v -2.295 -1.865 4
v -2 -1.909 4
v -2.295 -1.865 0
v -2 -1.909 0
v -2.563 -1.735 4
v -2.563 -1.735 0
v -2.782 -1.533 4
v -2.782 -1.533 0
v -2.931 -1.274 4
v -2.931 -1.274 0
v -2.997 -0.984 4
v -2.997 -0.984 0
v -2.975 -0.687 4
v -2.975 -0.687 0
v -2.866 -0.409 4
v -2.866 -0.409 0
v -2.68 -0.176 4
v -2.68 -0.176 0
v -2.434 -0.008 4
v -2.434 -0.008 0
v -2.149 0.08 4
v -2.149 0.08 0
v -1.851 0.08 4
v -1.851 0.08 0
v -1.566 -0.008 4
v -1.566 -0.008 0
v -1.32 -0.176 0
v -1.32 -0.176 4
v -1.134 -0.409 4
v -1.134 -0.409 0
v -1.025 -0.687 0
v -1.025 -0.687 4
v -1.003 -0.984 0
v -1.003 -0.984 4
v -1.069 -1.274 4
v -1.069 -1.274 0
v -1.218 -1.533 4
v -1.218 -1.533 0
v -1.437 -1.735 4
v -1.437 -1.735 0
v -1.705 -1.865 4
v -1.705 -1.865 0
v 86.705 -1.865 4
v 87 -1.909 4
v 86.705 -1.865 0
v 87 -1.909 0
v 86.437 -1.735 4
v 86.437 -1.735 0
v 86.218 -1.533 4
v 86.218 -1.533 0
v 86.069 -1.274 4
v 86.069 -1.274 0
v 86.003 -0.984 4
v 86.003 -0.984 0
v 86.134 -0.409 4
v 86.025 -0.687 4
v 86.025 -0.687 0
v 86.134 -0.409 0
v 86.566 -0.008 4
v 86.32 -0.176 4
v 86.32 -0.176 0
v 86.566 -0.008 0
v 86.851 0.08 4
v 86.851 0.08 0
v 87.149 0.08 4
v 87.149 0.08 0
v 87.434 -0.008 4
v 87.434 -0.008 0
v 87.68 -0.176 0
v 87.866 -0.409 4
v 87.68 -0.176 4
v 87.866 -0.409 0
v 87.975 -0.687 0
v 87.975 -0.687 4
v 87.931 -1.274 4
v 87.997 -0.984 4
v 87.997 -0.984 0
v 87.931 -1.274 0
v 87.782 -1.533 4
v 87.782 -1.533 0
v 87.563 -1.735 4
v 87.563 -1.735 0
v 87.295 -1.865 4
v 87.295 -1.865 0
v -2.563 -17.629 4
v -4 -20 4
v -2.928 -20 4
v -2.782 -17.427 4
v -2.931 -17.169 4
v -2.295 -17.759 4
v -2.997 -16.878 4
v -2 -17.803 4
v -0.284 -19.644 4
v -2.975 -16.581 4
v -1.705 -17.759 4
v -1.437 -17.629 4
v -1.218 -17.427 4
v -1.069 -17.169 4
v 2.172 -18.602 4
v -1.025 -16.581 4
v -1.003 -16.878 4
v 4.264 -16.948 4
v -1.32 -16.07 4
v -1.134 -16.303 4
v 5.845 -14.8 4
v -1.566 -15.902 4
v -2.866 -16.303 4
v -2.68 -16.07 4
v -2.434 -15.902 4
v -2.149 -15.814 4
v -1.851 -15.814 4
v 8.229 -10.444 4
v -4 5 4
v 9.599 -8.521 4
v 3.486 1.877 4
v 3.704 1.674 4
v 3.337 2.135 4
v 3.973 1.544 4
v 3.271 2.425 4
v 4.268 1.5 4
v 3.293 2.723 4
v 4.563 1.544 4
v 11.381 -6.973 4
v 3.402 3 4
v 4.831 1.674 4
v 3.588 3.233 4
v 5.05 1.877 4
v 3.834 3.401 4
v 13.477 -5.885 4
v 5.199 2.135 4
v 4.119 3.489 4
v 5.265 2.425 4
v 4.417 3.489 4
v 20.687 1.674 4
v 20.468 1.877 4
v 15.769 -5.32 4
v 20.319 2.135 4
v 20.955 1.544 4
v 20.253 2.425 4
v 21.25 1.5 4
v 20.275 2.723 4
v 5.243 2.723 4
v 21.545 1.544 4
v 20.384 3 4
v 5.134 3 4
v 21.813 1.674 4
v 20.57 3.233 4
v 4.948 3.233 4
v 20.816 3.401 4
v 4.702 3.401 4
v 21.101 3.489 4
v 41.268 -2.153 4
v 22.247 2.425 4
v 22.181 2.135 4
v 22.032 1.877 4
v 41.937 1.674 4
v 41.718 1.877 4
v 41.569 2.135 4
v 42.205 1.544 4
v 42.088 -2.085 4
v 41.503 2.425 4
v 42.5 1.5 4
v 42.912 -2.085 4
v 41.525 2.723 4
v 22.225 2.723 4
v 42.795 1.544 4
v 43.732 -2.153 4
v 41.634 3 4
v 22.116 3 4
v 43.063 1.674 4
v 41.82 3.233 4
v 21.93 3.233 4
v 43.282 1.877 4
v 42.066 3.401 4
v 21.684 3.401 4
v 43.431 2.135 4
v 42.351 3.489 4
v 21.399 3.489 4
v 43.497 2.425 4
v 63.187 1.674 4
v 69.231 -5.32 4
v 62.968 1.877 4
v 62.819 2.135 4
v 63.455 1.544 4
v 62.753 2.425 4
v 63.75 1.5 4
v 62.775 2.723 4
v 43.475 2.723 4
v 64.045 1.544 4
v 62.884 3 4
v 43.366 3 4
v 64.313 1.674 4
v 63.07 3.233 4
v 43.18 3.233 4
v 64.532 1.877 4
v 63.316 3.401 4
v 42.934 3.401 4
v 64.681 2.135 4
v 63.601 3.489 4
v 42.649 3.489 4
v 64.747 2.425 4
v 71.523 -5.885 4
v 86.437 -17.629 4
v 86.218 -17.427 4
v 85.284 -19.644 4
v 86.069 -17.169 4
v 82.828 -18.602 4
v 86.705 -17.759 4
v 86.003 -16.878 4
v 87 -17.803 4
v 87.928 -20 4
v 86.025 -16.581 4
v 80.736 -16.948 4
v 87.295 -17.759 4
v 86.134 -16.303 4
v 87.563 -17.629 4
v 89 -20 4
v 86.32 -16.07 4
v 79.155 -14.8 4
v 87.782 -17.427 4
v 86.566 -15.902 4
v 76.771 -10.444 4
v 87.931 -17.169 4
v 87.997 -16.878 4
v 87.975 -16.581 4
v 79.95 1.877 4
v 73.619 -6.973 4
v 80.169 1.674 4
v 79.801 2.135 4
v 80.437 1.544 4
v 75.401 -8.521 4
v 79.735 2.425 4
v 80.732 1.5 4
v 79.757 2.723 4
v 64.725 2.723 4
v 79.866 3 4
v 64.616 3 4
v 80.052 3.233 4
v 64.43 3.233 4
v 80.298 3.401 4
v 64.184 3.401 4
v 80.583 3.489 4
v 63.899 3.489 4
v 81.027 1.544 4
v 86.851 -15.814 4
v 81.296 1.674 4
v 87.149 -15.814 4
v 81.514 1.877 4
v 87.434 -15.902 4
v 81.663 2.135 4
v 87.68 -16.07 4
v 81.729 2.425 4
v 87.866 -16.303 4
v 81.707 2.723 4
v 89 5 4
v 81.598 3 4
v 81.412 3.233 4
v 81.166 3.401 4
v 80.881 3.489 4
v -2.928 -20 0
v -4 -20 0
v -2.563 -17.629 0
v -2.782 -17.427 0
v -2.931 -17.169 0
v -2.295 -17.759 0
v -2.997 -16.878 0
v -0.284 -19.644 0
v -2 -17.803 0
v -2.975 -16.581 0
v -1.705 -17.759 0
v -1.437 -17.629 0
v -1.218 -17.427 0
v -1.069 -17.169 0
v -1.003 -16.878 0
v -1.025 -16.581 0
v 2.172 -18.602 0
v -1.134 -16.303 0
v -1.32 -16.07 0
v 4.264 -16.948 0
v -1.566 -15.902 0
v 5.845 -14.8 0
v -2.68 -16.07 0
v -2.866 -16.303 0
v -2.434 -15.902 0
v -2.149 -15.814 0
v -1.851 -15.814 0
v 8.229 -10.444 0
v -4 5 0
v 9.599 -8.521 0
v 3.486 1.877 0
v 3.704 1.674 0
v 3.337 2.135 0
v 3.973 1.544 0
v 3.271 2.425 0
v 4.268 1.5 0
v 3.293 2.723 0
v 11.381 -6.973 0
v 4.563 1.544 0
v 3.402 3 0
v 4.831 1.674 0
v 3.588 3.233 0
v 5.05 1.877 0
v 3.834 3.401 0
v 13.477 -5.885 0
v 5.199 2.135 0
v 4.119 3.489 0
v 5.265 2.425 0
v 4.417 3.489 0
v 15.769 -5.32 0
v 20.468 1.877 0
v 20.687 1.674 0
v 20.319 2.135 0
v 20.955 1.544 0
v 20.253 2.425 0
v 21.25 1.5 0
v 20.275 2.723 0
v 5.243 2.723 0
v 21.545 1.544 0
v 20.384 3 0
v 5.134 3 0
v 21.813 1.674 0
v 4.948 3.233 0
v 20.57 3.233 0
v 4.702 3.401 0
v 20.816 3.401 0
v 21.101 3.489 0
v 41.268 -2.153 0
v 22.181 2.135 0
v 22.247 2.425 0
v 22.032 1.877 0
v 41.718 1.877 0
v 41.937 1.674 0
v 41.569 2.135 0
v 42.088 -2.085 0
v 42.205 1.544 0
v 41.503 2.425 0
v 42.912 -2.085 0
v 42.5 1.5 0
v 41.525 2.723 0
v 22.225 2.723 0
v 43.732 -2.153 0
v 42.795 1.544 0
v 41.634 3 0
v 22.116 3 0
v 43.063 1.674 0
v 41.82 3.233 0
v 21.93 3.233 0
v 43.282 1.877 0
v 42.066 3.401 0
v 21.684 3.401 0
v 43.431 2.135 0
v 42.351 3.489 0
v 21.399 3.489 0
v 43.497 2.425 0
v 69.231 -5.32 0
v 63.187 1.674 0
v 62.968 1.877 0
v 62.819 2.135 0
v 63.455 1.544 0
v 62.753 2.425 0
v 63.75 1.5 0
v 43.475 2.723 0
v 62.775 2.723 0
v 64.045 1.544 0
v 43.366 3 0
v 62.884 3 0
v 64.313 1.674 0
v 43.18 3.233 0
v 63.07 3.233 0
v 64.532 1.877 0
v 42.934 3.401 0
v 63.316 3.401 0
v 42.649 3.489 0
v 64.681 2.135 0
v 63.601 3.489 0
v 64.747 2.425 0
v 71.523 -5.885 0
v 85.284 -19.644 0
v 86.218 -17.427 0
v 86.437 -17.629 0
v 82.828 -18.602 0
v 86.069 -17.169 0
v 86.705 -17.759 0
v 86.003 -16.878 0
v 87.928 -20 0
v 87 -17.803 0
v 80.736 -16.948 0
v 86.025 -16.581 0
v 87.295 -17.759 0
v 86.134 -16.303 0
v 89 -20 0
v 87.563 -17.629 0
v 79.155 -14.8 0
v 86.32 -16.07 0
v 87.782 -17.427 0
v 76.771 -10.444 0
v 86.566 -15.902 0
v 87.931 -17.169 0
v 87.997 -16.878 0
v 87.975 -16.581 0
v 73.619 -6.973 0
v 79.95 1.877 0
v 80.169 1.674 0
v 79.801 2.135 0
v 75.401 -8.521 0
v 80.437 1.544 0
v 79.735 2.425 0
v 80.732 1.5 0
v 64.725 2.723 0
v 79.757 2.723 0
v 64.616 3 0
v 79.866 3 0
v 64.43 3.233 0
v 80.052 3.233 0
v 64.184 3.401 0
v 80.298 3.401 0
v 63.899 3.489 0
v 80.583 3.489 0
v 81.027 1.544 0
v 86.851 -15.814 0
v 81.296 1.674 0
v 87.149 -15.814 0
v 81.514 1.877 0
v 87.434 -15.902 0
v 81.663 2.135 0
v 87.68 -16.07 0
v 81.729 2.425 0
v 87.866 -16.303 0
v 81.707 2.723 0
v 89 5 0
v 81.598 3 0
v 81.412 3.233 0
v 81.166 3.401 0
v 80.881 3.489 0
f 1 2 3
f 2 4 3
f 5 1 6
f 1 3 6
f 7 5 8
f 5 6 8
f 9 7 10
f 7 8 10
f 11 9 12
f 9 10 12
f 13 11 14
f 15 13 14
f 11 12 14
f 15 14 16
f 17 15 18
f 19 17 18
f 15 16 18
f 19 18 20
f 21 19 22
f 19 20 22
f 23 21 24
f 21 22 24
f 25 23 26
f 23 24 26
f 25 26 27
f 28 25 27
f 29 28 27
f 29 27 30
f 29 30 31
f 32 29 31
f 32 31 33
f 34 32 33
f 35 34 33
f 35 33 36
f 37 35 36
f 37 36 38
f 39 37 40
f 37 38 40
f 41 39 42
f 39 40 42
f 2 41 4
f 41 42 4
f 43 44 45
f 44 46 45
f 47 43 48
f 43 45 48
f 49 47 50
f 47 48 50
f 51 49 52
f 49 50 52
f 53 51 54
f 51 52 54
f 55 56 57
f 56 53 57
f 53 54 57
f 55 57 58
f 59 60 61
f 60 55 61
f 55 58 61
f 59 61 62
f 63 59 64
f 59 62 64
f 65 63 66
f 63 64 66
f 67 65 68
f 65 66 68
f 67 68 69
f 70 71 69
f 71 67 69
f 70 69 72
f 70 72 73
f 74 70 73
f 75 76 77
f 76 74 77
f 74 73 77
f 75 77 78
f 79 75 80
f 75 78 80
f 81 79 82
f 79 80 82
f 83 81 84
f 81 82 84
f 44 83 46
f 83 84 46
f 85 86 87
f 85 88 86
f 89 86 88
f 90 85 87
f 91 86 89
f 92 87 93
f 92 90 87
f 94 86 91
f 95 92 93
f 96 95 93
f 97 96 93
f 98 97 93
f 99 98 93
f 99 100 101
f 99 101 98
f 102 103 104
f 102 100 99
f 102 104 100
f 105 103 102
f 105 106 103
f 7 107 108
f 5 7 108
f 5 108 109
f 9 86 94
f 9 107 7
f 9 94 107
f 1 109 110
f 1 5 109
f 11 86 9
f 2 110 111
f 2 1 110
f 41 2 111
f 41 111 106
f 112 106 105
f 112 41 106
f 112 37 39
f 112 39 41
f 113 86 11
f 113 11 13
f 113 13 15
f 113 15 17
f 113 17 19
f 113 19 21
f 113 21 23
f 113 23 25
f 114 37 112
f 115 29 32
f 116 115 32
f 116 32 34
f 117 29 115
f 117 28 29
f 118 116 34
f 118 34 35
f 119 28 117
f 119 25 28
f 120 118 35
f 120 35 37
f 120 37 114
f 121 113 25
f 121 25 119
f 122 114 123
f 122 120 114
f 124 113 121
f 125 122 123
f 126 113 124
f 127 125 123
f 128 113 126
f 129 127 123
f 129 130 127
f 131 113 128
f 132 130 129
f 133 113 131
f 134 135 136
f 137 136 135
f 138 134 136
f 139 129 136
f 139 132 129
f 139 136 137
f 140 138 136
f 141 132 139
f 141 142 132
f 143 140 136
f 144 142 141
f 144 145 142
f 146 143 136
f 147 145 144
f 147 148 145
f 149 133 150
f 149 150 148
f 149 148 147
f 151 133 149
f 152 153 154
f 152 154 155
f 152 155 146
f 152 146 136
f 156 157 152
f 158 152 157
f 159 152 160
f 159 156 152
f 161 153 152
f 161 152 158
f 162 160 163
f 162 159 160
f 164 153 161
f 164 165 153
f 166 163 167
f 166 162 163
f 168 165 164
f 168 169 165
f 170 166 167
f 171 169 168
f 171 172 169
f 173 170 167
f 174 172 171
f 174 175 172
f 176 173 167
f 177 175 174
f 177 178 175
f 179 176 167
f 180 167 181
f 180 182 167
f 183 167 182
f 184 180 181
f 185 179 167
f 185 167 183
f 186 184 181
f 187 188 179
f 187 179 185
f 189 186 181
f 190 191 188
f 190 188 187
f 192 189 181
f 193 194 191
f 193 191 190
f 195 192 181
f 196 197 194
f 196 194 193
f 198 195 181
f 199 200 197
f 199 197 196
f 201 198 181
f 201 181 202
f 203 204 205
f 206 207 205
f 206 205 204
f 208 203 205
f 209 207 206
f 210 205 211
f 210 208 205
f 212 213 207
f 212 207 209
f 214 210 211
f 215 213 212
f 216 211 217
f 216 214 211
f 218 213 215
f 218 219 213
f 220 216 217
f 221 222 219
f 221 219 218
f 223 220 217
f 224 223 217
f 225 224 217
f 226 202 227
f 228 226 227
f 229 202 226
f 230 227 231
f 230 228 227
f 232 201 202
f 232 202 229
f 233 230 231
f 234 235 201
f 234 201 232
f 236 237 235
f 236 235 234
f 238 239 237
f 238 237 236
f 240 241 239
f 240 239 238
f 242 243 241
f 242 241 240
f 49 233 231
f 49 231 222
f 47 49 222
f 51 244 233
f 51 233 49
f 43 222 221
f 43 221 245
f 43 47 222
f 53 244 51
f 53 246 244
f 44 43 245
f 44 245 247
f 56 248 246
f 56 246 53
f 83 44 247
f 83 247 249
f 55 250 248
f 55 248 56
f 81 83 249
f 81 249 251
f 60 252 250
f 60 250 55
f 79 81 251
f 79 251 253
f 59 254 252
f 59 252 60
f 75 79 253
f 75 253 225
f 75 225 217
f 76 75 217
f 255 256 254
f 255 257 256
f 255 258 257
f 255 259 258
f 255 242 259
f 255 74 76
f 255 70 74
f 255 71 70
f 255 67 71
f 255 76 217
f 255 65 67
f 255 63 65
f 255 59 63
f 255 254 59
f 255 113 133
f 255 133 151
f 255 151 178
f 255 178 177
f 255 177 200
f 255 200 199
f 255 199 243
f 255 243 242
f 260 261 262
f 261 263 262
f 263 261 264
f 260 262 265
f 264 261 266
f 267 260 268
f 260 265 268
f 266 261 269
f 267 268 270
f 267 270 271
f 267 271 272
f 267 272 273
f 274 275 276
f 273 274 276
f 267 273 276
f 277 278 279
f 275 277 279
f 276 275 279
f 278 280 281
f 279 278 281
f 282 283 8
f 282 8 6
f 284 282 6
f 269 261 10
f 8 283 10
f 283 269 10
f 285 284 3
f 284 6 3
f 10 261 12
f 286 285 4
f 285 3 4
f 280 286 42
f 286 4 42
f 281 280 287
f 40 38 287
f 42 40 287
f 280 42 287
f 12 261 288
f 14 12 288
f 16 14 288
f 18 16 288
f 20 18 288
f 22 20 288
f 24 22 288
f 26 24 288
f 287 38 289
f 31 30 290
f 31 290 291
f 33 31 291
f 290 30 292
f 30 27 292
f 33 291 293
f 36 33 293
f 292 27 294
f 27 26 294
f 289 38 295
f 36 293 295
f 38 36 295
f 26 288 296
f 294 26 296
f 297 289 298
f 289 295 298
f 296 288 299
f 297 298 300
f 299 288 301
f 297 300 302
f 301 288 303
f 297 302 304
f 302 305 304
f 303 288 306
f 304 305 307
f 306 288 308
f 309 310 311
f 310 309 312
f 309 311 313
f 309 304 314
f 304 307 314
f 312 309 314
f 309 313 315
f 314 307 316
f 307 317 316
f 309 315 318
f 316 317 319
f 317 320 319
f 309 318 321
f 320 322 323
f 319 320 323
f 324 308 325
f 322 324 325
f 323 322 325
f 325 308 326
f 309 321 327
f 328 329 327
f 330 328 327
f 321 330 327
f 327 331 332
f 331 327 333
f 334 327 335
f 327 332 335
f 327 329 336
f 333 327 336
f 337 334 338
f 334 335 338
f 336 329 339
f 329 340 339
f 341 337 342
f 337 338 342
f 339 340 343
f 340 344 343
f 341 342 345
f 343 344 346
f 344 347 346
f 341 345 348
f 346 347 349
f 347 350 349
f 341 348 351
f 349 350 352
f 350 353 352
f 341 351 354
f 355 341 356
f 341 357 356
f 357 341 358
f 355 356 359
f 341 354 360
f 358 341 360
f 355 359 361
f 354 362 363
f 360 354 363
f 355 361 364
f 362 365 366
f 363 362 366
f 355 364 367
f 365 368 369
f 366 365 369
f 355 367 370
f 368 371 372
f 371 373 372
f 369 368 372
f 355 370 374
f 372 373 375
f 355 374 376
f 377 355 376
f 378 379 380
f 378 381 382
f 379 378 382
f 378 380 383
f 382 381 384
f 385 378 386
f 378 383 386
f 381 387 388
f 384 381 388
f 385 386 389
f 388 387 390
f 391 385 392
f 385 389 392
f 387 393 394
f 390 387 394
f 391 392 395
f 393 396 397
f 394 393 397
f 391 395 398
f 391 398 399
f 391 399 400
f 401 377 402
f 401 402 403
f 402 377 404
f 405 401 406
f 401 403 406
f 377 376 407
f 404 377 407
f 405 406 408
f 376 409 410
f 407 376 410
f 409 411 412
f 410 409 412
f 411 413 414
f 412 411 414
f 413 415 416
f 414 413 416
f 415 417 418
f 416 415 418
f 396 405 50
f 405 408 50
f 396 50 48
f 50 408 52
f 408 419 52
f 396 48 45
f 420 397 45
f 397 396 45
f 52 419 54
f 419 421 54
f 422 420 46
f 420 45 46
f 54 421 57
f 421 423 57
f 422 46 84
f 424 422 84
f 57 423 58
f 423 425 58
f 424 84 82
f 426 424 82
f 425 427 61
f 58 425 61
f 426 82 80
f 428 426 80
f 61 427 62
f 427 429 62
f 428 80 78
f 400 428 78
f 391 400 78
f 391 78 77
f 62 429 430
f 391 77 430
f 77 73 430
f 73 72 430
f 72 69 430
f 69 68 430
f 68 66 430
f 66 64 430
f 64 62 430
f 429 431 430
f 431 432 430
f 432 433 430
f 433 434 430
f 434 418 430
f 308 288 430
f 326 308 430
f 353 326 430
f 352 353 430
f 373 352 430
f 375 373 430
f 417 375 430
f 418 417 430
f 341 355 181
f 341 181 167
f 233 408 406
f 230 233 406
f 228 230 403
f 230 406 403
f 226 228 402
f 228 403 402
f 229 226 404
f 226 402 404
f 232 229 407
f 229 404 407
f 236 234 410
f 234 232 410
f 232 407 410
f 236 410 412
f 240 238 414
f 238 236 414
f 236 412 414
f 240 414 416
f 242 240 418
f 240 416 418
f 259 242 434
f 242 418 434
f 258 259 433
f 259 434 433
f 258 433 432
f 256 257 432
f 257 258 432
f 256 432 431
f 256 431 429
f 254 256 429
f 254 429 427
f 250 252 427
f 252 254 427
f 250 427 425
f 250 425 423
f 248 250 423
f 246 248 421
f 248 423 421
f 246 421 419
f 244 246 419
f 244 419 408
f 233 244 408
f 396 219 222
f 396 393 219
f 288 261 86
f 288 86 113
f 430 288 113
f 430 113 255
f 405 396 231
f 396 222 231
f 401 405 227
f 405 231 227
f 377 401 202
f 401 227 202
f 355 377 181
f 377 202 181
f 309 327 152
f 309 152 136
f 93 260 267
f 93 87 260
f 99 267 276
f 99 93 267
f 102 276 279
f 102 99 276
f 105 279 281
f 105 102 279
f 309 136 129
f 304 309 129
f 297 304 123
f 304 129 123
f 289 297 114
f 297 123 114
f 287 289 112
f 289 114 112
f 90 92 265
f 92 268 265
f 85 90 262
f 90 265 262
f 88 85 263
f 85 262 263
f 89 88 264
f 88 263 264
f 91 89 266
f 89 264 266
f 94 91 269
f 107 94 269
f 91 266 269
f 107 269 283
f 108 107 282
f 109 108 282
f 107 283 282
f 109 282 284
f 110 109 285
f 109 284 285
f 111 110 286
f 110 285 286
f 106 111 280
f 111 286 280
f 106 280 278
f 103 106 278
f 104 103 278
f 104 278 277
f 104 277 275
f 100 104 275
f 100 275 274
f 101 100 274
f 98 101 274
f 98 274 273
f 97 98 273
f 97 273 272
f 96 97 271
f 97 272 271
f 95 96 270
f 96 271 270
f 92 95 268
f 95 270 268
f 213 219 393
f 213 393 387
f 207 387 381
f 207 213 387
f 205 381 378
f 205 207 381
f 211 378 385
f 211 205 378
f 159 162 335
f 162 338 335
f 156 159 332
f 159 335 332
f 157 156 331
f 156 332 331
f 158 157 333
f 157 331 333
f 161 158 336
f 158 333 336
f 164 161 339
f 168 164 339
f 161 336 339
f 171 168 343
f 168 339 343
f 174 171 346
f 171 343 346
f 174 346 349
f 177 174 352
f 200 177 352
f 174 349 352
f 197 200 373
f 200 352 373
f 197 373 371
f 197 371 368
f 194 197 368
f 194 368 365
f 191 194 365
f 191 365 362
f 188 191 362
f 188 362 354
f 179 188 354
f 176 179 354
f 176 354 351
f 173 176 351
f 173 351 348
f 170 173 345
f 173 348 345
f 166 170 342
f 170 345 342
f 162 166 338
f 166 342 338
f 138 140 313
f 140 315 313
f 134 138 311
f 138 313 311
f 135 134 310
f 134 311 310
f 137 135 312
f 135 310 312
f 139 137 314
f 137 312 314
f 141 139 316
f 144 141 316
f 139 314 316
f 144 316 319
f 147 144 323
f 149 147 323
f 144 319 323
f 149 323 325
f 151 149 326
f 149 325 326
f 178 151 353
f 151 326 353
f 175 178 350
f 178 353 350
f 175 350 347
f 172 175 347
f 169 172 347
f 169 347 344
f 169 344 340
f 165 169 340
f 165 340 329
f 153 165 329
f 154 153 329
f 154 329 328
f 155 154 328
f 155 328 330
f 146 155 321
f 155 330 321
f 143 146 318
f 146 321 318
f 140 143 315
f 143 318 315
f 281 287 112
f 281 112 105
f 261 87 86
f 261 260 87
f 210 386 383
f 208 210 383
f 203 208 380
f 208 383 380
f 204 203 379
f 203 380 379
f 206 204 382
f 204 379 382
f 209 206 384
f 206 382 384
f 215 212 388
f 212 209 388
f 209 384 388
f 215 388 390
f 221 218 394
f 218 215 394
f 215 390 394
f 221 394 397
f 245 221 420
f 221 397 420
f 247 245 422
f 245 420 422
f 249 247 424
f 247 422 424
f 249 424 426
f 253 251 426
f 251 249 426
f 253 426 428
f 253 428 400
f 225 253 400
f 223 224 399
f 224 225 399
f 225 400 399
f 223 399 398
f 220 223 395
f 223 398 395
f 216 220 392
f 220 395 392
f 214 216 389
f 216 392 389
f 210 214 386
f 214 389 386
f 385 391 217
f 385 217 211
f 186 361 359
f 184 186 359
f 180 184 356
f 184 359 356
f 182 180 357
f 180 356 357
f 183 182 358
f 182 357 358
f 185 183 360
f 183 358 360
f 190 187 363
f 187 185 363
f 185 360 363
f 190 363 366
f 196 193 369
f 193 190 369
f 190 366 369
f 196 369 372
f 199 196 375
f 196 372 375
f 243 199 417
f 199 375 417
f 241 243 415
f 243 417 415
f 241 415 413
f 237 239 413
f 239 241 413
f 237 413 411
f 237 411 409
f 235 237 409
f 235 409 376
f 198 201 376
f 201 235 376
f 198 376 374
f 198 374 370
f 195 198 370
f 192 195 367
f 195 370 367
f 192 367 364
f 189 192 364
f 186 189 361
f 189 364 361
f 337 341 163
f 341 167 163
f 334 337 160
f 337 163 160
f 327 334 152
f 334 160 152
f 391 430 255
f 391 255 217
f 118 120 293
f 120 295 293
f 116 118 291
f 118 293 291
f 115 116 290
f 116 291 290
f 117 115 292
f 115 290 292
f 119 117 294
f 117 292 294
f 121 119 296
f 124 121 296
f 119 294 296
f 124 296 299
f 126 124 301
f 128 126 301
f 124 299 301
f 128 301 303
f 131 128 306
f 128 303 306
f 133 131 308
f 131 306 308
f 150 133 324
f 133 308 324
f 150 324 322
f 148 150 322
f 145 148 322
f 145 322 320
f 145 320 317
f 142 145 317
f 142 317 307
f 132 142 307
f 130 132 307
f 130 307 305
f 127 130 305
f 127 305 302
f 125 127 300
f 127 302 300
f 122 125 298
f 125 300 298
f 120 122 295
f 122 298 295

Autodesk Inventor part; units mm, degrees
ref_plane "YZ Plane" through (0, 0, 0) normal (1, 0, 0) x (0, 1, 0)
ref_plane "XZ Plane" through (0, 0, 0) normal (0, 1, 0) x (-1, 0, 0)
ref_plane "XY Plane" through (0, 0, 0) normal (0, 0, 1) x (1, 0, 0)
sketch "Sketch1" plane through (0, 0, 0) normal (0, 0, 1) x (1, 0, 0)
  line L0 (-3.5, 6) -> (-3.5, -50) construction
  line L1 (-3.5, -50) -> (0, -50) construction
  line L2 (0, -50) -> (0, 6) construction
  line L3 (-3.5, 6) -> (0, 6) construction
  line L4 (0, 0) -> (85, 0) construction
  line L5 (85, 0) -> (85, 5) construction
  line L6 (0, 5) -> (85, 5) construction
  line L7 (0, 0) -> (0, 5) construction
  line L8 (88.5, 6) -> (88.5, -50) construction
  line L9 (88.5, 6) -> (85, 6) construction
  line L10 (85, -50) -> (85, 6) construction
  line L11 (88.5, -50) -> (85, -50) construction
  line L12 (-4, 5) -> (42.5, 5)
  line L13 (42.5, 5) -> (42.5, -2)
  line L14 (42.5, -2) -> (10.6869, -5.951)
  line L15 (10.6869, -5.951) -> (3, -20)
  line L16 (3, -20) -> (-4, -20)
  line L17 (-4, -20) -> (-4, 5)
  line L18 (0, 2.5) -> (42.5, 2.5) construction
  line L19 (-2, 5) -> (-2, -20) construction
  point P0 (4.2678, 2.5)
  point P1 (21.25, 2.5)
  point P2 (-2, -0.9091)
  point P3 (-2, -16.8032)
  dimension "d0" = 4
  dimension "d1" = 25
  dimension "d2" = 7
  dimension "d3" = 7
  dimension "d7" = 2
extrude "Extrusion1" add sketch "Sketch1" along normal blind 4
sketch "Sketch2" plane through (0, 0, 4) normal (0, 0, 1) x (1, 0, 0)
  point P0 (0, 0)
  point P1 (42.5, 2.5)
  point P2 (42.5, 2.5)
  point P3 (21.25, 2.5)
  point P4 (4.2678, 2.5)
  point P5 (-2, -0.9091)
  point P6 (-2, -16.8032)
hole "Hole1" at (42.5, 2.5, 4) at (21.25, 2.5, 4) at (4.2678, 2.5, 4) at (-2, -0.9091, 4) at (-2, -16.8032, 4) direction (0, 0, -1) diameter 2 end through all
mirror "Mirror1" about plane through (42.5, -2, 0) normal (1, 0, 0)
fillet "Fillet1" radius 10 5 edges at (3, -20, 2) (10.6869, -5.951, 2) (42.5, -2, 2) (74.3131, -5.951, 2) (82, -20, 2)
properties part number "segment0c"
